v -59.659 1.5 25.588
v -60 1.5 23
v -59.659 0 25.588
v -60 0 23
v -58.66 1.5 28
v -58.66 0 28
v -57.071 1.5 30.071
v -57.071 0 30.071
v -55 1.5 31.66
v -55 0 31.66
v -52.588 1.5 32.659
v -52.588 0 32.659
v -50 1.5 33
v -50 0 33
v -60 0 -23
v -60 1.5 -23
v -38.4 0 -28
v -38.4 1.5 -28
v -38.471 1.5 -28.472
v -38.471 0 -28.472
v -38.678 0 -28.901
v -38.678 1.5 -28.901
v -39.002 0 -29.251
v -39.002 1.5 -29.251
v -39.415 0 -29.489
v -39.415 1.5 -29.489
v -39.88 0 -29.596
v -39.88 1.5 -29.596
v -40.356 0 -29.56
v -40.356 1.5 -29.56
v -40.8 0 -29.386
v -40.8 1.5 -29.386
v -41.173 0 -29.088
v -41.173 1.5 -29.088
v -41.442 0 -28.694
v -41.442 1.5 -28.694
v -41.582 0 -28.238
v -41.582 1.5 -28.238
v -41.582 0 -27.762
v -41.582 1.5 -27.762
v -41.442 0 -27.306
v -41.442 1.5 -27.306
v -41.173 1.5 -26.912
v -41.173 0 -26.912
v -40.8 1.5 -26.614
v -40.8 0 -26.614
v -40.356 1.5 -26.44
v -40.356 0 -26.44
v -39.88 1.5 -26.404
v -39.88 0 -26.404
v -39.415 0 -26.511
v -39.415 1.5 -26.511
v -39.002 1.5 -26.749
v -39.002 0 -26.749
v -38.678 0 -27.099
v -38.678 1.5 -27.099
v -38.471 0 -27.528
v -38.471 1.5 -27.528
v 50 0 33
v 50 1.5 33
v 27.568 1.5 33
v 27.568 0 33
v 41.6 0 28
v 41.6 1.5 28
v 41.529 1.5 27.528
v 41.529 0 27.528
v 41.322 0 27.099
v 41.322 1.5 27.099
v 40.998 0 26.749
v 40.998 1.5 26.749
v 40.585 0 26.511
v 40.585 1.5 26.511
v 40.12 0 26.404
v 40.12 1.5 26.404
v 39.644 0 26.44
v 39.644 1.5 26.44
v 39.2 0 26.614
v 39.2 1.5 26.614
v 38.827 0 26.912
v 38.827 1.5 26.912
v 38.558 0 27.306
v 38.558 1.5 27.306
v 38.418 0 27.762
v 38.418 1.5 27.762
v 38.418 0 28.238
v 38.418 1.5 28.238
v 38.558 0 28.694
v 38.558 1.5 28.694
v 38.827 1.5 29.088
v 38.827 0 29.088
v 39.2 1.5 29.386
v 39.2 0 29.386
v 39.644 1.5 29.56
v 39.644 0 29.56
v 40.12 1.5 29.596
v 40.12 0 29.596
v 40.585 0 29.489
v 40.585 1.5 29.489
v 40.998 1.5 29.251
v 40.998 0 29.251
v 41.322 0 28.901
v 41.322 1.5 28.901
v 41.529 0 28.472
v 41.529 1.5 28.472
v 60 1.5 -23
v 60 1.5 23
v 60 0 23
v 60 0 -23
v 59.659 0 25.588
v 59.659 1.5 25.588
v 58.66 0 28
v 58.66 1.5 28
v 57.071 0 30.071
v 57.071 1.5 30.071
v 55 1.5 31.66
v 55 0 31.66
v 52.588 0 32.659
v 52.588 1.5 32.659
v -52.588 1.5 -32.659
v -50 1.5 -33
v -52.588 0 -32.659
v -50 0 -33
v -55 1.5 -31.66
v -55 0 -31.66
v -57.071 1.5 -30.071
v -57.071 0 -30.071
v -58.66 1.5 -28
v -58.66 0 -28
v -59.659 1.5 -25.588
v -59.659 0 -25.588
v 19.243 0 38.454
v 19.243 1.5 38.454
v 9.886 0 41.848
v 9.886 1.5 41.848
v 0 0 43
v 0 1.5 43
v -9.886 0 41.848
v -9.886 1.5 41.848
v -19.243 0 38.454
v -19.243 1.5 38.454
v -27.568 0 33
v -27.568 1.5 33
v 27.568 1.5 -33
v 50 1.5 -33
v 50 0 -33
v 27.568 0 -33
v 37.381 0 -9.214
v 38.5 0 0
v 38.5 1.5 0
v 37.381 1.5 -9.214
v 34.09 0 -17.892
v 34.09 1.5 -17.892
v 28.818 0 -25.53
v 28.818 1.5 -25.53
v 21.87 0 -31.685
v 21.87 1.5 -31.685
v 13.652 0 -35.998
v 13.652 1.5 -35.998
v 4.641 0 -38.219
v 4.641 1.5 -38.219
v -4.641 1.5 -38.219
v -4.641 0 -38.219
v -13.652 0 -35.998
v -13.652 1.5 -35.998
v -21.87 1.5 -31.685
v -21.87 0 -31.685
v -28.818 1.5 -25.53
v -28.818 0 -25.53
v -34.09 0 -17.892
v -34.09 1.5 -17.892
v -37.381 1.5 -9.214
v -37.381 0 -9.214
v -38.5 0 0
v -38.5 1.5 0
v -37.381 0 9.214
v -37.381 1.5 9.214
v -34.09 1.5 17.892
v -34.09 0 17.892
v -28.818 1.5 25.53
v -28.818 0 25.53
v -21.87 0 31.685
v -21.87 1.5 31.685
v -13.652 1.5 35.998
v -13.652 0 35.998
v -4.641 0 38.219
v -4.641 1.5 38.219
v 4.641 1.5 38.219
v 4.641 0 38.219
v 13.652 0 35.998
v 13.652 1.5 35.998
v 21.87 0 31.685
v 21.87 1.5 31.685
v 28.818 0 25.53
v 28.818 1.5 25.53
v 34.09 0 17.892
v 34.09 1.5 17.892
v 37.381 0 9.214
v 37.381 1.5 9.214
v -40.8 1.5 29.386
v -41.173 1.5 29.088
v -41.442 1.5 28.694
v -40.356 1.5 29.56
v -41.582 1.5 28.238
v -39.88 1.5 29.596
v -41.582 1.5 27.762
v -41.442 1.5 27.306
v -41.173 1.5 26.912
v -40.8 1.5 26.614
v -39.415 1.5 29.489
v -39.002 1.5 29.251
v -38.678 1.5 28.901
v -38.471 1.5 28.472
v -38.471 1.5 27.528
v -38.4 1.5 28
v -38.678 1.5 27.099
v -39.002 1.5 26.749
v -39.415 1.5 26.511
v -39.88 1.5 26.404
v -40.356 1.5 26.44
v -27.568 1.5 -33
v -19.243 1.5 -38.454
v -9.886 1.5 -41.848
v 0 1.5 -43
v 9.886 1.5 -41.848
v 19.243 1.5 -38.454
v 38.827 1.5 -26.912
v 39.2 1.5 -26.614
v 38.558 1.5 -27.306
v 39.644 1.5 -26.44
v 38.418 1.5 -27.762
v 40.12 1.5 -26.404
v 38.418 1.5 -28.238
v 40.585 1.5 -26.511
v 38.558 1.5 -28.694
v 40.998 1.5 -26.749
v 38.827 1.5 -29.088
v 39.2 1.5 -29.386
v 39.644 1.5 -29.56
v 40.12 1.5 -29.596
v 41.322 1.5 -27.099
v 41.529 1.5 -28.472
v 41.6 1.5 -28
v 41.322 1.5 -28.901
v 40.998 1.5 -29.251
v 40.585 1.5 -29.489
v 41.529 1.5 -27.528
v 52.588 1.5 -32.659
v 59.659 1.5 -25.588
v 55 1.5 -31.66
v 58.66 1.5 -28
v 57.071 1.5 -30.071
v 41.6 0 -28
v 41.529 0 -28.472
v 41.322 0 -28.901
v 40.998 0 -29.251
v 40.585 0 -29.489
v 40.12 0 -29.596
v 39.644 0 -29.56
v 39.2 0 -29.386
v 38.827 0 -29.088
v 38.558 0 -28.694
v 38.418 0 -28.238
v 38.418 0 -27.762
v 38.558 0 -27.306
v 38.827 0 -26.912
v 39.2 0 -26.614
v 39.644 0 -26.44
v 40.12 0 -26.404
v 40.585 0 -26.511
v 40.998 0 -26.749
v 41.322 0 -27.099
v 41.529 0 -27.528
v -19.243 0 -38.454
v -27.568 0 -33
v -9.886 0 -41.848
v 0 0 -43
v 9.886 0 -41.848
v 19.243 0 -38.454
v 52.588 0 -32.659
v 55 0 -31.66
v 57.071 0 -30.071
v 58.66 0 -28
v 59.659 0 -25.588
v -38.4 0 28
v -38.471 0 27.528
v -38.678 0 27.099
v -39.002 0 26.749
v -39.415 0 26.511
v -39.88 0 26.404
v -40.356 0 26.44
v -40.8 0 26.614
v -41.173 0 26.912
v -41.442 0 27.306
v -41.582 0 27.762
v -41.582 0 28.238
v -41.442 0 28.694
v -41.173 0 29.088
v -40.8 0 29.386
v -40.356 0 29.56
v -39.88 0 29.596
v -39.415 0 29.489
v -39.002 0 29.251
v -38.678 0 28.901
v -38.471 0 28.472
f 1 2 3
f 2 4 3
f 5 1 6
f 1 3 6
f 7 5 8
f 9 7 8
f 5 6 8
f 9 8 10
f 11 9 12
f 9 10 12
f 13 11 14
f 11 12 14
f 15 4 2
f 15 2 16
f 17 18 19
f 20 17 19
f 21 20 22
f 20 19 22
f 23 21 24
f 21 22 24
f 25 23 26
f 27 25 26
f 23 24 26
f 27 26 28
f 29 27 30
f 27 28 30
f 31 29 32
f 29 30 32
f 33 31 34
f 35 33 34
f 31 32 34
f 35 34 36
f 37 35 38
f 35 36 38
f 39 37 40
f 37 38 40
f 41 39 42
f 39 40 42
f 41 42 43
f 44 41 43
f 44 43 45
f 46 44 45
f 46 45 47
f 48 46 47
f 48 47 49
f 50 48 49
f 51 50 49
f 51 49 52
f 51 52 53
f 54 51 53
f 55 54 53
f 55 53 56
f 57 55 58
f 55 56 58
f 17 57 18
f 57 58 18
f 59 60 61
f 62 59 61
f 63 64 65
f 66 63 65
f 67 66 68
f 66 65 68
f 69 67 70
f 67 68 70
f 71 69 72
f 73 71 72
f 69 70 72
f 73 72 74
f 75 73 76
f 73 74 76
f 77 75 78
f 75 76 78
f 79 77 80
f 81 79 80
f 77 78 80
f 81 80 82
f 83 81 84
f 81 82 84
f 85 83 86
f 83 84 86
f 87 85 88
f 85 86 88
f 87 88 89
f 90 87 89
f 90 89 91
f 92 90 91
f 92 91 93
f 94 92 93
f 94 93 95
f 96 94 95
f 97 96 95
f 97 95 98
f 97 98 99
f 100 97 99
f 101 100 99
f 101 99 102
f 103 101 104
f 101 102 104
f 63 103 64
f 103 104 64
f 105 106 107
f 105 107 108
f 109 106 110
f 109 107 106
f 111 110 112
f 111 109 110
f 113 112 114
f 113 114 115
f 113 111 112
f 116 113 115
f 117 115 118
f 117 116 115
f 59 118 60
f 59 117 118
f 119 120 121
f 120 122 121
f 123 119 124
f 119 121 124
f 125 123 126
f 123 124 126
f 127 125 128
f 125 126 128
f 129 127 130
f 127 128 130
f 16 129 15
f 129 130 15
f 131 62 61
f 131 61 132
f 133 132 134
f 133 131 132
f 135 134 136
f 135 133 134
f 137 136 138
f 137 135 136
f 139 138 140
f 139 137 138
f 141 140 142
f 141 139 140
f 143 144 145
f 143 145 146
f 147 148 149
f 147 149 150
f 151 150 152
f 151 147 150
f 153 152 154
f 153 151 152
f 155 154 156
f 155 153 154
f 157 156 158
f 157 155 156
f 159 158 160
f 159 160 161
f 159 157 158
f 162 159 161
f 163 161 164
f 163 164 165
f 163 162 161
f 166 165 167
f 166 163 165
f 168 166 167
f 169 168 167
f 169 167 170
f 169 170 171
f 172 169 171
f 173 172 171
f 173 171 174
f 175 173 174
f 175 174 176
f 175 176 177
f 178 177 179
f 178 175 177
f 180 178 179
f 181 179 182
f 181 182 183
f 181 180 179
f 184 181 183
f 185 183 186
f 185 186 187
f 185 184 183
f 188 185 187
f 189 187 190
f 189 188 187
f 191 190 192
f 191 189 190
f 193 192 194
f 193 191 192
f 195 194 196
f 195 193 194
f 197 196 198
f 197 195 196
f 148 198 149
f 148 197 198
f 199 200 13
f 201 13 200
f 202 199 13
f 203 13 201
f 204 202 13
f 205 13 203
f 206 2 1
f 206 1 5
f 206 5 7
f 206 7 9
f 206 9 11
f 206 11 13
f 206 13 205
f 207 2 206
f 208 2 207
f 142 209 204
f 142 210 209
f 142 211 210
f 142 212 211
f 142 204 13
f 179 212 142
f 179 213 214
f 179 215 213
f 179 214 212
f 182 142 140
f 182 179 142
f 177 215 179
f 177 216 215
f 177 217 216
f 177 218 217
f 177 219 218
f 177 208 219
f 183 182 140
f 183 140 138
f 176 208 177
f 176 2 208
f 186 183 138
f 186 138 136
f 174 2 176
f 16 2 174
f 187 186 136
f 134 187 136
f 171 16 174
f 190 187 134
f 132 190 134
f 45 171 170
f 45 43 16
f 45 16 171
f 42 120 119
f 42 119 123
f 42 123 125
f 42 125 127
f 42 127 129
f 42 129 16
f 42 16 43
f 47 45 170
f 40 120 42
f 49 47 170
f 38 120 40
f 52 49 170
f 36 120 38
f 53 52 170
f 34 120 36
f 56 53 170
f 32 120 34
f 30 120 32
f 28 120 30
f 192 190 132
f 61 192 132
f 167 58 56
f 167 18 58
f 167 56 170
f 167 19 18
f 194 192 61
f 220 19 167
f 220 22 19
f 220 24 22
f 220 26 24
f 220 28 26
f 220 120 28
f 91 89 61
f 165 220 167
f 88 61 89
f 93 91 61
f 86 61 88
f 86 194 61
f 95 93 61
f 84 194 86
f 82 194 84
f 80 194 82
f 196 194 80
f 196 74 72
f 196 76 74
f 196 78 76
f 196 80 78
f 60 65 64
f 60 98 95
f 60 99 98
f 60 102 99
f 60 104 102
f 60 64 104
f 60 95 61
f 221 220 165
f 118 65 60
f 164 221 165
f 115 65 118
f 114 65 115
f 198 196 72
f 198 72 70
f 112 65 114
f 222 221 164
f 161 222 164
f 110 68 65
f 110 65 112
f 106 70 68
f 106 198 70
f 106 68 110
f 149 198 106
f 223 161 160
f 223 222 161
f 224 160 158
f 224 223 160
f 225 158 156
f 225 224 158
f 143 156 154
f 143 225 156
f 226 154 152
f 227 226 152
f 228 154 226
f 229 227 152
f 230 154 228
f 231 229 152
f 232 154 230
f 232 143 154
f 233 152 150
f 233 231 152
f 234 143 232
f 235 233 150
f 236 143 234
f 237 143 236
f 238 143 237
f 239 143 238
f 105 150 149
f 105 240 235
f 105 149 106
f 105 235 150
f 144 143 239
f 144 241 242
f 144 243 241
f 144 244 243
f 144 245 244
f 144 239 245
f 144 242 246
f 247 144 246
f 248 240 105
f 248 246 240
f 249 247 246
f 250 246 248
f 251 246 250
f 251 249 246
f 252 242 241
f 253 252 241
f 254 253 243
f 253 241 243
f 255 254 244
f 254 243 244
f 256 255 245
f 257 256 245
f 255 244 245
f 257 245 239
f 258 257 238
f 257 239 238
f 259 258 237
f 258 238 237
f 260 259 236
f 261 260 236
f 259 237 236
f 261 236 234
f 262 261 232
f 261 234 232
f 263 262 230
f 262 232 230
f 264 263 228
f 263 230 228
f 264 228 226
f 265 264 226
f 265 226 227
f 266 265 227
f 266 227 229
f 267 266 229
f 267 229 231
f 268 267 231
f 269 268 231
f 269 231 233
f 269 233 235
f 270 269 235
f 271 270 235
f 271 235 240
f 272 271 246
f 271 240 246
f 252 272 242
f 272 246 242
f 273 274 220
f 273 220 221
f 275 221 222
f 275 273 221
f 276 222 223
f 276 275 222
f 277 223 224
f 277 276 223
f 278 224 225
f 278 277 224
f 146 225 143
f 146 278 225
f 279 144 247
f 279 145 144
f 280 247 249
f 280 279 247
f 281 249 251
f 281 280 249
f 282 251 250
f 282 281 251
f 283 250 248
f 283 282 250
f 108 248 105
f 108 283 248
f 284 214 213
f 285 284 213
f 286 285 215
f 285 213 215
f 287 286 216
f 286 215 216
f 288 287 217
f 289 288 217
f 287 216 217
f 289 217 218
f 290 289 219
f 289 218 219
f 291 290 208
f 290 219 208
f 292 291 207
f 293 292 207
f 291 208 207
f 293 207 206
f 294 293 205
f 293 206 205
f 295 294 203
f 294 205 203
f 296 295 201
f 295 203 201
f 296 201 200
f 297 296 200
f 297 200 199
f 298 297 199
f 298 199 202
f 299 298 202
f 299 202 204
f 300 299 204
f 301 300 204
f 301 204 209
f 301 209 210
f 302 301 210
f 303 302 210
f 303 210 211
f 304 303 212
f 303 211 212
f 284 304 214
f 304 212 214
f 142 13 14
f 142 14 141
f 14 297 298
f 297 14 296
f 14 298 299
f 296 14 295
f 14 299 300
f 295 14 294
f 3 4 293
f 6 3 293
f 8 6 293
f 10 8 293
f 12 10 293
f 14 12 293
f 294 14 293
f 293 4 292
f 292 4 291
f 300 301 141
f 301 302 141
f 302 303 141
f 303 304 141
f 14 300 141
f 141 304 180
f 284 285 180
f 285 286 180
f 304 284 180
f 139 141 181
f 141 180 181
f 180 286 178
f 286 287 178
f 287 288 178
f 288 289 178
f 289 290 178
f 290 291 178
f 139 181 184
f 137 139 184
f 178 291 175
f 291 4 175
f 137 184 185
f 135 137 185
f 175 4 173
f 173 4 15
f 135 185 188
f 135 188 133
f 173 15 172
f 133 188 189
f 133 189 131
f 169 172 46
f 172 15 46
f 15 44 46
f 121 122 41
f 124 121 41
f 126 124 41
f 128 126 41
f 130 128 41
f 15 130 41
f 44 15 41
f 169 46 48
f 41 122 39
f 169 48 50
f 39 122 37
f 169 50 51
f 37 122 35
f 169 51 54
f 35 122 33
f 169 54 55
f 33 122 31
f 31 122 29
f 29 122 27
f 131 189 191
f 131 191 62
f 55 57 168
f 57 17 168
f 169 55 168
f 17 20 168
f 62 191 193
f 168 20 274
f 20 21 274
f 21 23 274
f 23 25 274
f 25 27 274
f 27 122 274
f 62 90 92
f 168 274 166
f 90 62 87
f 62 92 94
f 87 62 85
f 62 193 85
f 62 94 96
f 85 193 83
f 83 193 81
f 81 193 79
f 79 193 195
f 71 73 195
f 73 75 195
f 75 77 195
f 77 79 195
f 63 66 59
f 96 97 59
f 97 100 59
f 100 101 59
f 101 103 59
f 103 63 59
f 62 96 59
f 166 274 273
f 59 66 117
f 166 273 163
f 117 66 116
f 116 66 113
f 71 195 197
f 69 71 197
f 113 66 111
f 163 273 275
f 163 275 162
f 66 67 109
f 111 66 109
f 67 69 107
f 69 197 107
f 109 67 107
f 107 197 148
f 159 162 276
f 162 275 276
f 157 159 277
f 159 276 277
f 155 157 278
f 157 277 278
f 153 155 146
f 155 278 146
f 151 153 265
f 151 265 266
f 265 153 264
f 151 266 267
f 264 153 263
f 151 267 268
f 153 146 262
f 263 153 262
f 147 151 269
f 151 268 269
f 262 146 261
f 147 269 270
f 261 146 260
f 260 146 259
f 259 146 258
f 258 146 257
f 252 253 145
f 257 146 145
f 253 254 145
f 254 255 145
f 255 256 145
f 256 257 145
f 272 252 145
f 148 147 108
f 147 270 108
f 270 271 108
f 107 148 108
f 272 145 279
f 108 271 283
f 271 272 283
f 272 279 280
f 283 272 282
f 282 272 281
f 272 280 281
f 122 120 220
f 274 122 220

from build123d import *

# Parameters (mm, degrees)
SKETCH2_R           = 38.5
BOSS_EXTRUDE4_DEPTH = 1.5
BOSS_EXTRUDE5_DEPTH = 1.5
SKETCH4_R           = 1.6
CUT_EXTRUDE1_DEPTH  = 1.5
FILLET1_R           = 10


with BuildPart() as part:
    # Sketch2 → Boss-Extrude4 (new body)
    with BuildSketch(Plane(origin=(0, 0, 0), x_dir=(1, 0, 0), z_dir=(0, 1, 0))):
        with BuildLine():
            Line((-60, 32), (-28.722813233, 32))
            ThreePointArc((-28.722813233, 32), (0, 43), (28.722813233, 32))
            Line((28.722813233, 32), (60, 32))
            Line((60, 32), (60, -32))
            Line((60, -32), (28.722813233, -32))
            ThreePointArc((28.722813233, -32), (0, -43), (-28.722813233, -32))
            Line((-28.722813233, -32), (-60, -32))
            Line((-60, -32), (-60, 32))
        make_face()
        Circle(SKETCH2_R, mode=Mode.SUBTRACT)
    extrude(amount=BOSS_EXTRUDE4_DEPTH)

    # Sketch3 → Boss-Extrude5 (add)
    with BuildSketch(Plane(origin=(0, 1.5, 0), x_dir=(1, 0, 0), z_dir=(0, 1, 0))):
        Polygon((60, 32), (60, 33), (22.967632109, 33), (40.759186936, 20.496414307), (60, 20.496414307), align=None)
        Polygon((60, -20.496414307), (60, -32), (60, -33), (22.967632109, -33), (40.759186936, -20.496414307), align=None)
        Polygon((-60, -32), (-60, -33), (-22.967632109, -33), (-40.759186936, -20.496414307), (-60, -20.496414307), align=None)
        Polygon((-60, 20.496414307), (-60, 32), (-60, 33), (-22.967632109, 33), (-40.759186936, 20.496414307), align=None)
    extrude(amount=-BOSS_EXTRUDE5_DEPTH)

    # Sketch4 → Cut-Extrude1 (cut)
    with BuildSketch(Plane(origin=(0, 1.5, 0), x_dir=(1, 0, 0), z_dir=(0, 1, 0))):
        with Locations((40, 28)):
            Circle(SKETCH4_R)
        with Locations((40, -28)):
            Circle(SKETCH4_R)
        with Locations((-40, -28)):
            Circle(SKETCH4_R)
        with Locations((-40, 28)):
            Circle(SKETCH4_R)
    extrude(amount=-CUT_EXTRUDE1_DEPTH, mode=Mode.SUBTRACT)

    # Fillet1
    fillet1_edges = [part.edges().sort_by_distance(p)[0] for p in [
        (60, 0.75, -33),
        (60, 0.75, 33),
        (-60, 0.75, 33),
        (-60, 0.75, -33),
    ]]
    fillet(fillet1_edges, radius=FILLET1_R)


solid = part.part
